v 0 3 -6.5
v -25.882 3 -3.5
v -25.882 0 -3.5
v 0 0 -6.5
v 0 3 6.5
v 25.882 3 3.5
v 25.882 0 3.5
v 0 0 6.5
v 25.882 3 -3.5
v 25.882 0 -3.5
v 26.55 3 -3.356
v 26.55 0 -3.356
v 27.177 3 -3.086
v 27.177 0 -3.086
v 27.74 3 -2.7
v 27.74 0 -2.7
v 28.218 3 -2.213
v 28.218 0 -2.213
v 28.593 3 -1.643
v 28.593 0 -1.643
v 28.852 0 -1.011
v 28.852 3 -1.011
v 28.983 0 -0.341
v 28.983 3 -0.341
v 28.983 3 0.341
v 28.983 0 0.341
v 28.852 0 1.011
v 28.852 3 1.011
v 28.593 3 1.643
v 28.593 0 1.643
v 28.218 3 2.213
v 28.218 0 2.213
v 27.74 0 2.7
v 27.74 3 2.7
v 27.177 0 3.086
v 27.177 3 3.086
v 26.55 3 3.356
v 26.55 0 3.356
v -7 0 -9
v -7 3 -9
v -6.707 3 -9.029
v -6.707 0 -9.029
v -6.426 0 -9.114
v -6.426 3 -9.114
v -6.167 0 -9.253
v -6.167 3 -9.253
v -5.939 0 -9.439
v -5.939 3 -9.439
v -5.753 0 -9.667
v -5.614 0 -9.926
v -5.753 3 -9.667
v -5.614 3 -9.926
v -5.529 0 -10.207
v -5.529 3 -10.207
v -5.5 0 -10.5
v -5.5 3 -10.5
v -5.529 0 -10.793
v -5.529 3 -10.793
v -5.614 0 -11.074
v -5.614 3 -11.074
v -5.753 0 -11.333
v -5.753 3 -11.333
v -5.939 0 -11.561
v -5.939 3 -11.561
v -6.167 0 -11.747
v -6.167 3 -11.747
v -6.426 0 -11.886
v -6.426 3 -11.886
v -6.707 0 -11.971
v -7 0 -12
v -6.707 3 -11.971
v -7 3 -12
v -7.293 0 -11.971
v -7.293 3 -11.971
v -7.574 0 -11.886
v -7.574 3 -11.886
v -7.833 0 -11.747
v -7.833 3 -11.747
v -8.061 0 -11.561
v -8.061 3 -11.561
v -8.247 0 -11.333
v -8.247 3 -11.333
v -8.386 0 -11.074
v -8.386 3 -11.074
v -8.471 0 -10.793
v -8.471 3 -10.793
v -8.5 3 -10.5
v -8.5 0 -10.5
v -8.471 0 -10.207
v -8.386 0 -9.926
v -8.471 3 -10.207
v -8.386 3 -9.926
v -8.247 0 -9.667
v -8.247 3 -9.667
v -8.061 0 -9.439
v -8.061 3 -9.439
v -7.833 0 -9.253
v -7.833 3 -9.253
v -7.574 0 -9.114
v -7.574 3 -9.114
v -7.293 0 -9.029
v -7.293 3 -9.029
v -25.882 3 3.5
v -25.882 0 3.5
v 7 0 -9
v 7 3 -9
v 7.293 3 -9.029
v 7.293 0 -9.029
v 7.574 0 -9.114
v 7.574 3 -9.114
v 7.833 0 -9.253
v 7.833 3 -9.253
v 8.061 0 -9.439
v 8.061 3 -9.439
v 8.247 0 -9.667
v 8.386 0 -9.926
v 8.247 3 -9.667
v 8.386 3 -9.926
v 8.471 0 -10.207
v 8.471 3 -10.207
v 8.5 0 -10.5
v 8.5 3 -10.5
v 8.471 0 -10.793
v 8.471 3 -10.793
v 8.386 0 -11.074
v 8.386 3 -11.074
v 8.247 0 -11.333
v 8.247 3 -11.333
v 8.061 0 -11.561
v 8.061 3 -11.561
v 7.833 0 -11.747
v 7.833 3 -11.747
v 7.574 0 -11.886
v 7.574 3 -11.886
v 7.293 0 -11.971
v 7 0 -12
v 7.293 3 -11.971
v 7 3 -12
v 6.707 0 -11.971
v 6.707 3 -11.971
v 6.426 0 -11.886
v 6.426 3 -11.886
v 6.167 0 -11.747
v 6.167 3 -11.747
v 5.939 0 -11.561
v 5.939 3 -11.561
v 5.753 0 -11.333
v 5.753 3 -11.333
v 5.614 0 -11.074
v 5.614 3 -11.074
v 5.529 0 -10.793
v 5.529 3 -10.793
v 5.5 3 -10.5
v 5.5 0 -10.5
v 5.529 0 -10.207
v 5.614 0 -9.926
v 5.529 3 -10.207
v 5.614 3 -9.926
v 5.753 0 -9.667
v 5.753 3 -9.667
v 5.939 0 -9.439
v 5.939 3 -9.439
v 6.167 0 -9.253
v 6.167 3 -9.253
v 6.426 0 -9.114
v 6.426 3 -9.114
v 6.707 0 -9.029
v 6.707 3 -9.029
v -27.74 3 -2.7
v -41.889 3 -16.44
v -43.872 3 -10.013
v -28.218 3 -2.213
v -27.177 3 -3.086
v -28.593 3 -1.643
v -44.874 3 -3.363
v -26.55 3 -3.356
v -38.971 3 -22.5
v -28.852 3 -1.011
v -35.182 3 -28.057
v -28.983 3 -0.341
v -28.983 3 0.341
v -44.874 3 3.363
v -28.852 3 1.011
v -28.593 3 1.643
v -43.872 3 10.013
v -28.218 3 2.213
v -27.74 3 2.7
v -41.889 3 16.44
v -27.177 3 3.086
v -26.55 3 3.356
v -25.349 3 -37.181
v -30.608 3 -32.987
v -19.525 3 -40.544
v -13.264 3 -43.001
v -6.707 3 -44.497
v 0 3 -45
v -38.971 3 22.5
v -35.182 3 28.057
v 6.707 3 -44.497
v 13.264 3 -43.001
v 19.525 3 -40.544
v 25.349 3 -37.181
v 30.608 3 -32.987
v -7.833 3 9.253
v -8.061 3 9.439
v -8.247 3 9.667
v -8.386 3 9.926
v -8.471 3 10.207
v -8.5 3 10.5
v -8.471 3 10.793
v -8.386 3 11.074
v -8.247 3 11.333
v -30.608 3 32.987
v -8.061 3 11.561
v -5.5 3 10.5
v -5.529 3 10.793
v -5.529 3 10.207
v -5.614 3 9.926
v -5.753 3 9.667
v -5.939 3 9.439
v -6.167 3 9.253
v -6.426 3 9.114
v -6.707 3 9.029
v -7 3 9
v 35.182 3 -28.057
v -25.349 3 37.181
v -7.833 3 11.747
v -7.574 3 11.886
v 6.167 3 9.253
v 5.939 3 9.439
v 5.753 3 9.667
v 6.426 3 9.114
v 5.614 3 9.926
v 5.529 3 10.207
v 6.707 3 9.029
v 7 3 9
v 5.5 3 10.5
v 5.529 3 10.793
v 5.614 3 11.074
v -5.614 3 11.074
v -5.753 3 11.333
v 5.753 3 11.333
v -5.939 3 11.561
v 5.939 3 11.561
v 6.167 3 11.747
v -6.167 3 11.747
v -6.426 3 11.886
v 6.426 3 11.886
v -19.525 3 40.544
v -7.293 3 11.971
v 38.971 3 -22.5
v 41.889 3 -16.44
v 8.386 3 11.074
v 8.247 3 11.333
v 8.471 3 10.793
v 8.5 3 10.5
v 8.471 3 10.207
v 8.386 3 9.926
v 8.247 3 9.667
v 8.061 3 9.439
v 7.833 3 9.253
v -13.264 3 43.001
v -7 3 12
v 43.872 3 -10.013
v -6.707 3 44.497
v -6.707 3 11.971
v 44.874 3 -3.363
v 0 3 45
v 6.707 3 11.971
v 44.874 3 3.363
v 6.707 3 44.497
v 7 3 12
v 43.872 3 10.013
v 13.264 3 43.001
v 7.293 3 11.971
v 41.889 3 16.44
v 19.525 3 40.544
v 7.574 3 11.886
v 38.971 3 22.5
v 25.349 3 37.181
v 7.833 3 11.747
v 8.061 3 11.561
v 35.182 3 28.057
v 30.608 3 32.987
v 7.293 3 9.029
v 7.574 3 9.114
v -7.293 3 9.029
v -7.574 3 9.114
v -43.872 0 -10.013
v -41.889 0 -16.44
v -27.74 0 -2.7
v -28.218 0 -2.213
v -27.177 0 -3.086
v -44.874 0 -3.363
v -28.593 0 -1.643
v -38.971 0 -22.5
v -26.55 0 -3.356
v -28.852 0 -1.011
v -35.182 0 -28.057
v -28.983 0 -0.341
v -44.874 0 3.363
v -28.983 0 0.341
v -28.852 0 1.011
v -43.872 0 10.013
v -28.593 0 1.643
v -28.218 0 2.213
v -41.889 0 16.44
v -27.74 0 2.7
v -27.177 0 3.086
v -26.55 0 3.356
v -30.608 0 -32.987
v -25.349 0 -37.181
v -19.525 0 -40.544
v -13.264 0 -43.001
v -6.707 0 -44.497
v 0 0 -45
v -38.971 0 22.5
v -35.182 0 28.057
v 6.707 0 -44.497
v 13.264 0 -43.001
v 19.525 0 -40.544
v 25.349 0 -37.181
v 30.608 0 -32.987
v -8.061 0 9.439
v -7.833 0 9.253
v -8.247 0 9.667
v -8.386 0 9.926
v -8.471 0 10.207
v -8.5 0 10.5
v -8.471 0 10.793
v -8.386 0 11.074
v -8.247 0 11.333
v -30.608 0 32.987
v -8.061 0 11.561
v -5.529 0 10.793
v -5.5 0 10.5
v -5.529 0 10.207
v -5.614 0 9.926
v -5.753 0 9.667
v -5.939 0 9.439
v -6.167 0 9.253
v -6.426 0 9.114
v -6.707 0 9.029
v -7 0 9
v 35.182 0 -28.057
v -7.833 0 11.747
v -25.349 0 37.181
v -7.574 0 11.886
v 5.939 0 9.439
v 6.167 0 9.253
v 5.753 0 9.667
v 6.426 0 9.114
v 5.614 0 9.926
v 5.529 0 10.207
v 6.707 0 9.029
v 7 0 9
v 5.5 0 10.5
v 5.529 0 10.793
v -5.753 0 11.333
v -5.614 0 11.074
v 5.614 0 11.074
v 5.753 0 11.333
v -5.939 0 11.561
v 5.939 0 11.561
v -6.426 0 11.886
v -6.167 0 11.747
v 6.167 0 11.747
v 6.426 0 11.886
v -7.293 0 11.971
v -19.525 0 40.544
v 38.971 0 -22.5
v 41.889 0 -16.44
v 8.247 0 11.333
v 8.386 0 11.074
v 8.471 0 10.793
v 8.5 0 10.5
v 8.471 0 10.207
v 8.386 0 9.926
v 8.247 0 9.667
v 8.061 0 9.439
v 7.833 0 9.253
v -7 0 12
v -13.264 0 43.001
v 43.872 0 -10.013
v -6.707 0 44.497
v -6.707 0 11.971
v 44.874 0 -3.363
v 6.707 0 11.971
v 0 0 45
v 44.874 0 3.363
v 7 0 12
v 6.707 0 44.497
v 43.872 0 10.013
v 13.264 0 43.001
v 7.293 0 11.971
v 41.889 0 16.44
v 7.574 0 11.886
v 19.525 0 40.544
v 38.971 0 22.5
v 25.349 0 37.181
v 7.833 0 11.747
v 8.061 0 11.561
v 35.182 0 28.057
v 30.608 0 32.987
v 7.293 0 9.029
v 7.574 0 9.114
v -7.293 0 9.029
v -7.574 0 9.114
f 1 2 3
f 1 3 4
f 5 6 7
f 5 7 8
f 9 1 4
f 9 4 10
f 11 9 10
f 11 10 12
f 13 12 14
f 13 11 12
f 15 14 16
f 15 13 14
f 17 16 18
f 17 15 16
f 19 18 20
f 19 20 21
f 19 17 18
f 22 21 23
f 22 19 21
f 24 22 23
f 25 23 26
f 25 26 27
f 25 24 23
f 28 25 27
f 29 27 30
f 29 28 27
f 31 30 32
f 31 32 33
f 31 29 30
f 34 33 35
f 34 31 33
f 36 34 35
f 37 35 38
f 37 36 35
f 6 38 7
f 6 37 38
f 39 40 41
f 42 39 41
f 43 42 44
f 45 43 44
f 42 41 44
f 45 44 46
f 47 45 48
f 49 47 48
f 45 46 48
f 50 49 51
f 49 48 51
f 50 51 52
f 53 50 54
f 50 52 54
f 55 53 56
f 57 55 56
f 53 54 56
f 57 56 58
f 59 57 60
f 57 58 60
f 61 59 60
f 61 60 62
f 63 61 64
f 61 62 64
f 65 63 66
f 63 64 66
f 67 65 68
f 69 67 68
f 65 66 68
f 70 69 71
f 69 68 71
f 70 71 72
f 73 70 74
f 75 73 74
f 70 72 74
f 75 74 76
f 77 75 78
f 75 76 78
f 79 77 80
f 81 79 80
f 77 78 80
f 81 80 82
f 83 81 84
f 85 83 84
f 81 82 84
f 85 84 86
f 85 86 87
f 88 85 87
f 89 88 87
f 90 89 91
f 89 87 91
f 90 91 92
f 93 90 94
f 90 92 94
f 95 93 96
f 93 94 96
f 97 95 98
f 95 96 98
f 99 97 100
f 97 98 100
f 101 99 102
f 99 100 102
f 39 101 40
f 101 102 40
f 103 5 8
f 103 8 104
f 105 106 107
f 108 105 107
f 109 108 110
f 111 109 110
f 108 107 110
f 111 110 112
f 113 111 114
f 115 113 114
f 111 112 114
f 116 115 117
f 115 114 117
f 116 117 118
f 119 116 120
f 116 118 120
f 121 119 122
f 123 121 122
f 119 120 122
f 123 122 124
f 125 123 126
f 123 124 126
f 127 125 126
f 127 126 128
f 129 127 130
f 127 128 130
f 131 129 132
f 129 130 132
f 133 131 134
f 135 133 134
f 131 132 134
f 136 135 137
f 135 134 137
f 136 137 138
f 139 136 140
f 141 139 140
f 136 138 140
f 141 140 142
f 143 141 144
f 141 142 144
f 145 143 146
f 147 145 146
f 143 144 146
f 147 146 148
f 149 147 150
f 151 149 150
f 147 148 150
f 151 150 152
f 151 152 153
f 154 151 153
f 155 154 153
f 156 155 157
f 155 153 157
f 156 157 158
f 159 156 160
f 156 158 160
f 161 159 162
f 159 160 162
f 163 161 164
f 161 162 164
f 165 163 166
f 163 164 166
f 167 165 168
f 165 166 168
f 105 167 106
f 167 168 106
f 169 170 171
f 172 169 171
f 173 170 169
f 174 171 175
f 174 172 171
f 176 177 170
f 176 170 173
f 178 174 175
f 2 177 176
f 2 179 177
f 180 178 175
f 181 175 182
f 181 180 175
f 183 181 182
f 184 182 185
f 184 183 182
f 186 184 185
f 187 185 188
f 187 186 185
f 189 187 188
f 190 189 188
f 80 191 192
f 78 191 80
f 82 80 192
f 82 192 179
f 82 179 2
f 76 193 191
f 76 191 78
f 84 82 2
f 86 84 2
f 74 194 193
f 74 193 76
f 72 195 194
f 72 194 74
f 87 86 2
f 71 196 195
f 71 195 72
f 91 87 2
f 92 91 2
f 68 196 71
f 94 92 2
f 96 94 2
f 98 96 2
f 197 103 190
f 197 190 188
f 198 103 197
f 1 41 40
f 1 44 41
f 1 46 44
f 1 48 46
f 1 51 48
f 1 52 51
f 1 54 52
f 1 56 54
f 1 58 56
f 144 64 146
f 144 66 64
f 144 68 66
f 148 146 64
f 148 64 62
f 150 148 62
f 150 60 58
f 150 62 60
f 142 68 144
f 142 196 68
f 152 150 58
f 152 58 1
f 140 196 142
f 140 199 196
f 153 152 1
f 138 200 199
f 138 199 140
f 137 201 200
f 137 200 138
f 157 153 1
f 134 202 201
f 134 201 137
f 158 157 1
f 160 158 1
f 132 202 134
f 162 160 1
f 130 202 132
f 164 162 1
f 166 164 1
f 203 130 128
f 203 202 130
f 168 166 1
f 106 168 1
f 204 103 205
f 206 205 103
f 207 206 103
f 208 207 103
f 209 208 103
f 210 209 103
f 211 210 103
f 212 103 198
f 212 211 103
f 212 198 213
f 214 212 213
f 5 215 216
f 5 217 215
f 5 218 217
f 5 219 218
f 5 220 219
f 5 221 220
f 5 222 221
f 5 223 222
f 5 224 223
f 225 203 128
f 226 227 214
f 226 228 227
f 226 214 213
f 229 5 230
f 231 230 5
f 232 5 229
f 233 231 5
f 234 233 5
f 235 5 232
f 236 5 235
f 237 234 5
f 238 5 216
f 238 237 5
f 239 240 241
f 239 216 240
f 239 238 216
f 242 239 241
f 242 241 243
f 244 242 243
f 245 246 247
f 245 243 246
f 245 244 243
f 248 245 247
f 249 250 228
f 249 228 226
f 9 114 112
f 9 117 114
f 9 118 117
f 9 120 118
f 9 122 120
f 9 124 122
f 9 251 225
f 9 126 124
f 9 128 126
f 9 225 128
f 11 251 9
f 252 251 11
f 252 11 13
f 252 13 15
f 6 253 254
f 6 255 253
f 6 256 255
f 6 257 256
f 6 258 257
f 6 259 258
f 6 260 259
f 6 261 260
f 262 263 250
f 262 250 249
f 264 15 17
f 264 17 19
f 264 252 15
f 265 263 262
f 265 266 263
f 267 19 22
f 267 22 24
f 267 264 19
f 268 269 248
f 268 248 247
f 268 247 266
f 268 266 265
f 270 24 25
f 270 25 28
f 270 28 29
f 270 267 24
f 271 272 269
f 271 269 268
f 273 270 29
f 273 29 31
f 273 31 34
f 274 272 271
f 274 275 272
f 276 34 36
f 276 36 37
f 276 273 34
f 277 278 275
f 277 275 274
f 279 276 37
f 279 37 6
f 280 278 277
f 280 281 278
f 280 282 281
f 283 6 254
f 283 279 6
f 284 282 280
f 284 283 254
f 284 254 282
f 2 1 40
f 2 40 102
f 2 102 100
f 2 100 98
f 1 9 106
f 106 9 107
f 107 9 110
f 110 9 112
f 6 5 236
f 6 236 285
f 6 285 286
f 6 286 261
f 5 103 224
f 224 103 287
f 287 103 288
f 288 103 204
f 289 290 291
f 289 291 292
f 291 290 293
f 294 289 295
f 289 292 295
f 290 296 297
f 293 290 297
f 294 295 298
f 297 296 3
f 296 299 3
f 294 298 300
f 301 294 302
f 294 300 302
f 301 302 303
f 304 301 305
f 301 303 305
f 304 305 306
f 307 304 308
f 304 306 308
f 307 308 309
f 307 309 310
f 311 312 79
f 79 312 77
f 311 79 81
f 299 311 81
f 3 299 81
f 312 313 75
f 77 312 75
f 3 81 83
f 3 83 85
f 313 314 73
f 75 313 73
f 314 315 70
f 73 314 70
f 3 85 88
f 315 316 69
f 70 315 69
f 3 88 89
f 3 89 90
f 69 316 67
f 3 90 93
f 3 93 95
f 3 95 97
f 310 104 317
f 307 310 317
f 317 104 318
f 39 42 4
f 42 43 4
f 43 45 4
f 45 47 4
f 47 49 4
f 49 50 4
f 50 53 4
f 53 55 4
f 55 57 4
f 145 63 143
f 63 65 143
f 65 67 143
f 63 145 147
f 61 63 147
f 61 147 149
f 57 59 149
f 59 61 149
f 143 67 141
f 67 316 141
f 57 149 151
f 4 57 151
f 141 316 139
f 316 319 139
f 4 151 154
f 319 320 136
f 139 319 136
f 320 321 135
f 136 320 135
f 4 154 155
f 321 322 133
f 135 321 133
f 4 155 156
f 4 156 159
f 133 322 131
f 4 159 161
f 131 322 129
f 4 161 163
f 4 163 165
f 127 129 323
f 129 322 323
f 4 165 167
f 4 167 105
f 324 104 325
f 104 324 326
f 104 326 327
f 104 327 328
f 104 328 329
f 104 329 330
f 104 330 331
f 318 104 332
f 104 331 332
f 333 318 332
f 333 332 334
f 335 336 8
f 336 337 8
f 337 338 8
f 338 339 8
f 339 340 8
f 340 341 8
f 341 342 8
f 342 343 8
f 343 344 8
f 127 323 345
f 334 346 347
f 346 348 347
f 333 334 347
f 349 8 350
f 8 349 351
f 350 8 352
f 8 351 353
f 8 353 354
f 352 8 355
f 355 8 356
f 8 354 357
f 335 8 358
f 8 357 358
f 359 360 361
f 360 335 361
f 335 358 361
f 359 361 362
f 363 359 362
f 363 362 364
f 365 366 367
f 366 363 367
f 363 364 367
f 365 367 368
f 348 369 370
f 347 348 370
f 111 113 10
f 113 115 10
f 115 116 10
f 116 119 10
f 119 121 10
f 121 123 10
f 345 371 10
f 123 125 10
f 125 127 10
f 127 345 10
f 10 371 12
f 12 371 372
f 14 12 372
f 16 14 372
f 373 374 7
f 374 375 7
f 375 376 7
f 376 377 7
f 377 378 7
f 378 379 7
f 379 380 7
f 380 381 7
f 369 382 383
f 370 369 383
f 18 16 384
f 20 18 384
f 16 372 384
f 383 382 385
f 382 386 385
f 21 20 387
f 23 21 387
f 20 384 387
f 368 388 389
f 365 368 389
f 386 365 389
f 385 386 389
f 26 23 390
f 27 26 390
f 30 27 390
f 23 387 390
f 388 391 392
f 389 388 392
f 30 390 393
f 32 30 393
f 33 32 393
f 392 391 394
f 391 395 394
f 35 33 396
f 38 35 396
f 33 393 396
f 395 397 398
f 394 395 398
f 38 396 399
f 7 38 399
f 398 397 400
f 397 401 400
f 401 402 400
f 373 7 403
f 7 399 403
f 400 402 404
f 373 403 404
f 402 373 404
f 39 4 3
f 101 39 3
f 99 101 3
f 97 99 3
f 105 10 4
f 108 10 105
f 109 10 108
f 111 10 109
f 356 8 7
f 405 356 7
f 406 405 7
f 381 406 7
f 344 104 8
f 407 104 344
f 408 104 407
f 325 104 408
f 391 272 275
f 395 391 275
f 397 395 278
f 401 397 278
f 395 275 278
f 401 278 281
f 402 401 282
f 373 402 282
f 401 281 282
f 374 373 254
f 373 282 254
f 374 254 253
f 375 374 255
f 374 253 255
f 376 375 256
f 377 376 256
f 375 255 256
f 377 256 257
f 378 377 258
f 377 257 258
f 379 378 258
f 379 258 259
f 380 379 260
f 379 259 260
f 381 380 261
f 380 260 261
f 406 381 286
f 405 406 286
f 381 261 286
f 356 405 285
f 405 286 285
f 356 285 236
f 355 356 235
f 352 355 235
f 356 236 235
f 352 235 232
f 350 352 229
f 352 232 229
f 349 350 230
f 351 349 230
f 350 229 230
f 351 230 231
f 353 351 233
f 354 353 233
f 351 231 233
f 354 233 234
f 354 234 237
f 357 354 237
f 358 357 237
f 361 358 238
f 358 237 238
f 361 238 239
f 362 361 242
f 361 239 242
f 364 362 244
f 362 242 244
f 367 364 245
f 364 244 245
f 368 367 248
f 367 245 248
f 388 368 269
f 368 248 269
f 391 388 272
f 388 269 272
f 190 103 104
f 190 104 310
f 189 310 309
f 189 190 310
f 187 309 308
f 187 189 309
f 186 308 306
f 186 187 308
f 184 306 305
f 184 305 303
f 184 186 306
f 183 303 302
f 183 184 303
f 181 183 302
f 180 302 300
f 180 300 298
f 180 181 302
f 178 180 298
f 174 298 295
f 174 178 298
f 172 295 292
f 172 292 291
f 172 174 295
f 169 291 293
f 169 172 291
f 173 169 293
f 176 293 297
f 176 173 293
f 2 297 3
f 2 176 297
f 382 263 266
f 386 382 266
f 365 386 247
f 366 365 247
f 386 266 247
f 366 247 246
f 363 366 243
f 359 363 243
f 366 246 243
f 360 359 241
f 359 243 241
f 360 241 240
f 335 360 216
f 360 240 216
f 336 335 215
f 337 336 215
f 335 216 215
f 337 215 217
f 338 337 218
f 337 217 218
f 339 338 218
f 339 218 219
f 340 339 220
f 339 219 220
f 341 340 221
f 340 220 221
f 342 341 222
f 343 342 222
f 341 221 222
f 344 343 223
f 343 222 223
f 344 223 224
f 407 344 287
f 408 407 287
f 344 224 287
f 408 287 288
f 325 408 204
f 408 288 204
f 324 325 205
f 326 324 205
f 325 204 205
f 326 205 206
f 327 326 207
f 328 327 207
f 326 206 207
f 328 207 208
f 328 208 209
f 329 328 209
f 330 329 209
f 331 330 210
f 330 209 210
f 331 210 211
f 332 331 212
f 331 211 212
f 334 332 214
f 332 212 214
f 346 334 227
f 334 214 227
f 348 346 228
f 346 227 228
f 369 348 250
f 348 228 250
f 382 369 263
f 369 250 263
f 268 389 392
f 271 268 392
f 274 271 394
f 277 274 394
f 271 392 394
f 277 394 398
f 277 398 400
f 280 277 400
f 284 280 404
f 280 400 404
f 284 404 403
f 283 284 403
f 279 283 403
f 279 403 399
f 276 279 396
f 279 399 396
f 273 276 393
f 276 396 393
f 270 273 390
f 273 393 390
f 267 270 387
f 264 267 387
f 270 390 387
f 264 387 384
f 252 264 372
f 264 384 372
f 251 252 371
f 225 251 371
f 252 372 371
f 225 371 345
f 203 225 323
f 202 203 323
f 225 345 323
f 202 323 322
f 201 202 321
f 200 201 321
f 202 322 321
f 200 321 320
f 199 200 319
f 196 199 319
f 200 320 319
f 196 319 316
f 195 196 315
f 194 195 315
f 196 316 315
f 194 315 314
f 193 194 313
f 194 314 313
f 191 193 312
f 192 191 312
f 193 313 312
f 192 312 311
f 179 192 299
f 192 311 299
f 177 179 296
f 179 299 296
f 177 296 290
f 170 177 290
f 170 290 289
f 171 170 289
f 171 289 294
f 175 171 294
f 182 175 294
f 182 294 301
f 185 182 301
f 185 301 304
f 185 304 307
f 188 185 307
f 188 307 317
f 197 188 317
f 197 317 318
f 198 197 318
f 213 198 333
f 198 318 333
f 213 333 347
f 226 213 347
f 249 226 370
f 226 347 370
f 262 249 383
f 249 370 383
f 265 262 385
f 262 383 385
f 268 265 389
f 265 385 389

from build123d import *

# Parameters (mm, degrees)
SKETCH1_R           = 45
BOSS_EXTRUDE1_DEPTH = 3
CUT_EXTRUDE1_DEPTH  = 3
SKETCH4_R           = 1.5
CUT_EXTRUDE2_DEPTH  = 3


with BuildPart() as part:
    # Sketch1 → Boss-Extrude1 (new body)
    with BuildSketch(Plane(origin=(0, 0, 0), x_dir=(1, 0, 0), z_dir=(0, 1, 0))):
        with Locations(Location((0, 0, 0), (0, 0, 270))):
            Circle(SKETCH1_R)
    extrude(amount=BOSS_EXTRUDE1_DEPTH)

    # Sketch3 → Cut-Extrude1 (cut)
    with BuildSketch(Plane(origin=(0, 3, 0), x_dir=(1, 0, 0), z_dir=(0, 1, 0))):
        with BuildLine():
            Line((-25.882250574, 3.5), (0, 6.5))
            Line((0, 6.5), (25.882250574, 3.5))
            ThreePointArc((25.882250574, 3.5), (29, 0), (25.882250574, -3.5))
            Line((25.882250574, -3.5), (0, -6.5))
            Line((0, -6.5), (-25.882250574, -3.5))
            ThreePointArc((-25.882250574, -3.5), (-29, 0), (-25.882250574, 3.5))
        make_face()
    extrude(amount=-CUT_EXTRUDE1_DEPTH, mode=Mode.SUBTRACT)

    # Sketch4 → Cut-Extrude2 (cut)
    with BuildSketch(Plane(origin=(0, 3, 0), x_dir=(1, 0, 0), z_dir=(0, 1, 0))):
        with Locations(Location((-7, -10.5, 0), (0, 0, 270))):
            Circle(SKETCH4_R)
        with Locations(Location((7, -10.5, 0), (0, 0, 270))):
            Circle(SKETCH4_R)
        with Locations(Location((-7, 10.5, 0), (0, 0, 270))):
            Circle(SKETCH4_R)
        with Locations(Location((7, 10.5, 0), (0, 0, 270))):
            Circle(SKETCH4_R)
    extrude(amount=-CUT_EXTRUDE2_DEPTH, mode=Mode.SUBTRACT)


solid = part.part
